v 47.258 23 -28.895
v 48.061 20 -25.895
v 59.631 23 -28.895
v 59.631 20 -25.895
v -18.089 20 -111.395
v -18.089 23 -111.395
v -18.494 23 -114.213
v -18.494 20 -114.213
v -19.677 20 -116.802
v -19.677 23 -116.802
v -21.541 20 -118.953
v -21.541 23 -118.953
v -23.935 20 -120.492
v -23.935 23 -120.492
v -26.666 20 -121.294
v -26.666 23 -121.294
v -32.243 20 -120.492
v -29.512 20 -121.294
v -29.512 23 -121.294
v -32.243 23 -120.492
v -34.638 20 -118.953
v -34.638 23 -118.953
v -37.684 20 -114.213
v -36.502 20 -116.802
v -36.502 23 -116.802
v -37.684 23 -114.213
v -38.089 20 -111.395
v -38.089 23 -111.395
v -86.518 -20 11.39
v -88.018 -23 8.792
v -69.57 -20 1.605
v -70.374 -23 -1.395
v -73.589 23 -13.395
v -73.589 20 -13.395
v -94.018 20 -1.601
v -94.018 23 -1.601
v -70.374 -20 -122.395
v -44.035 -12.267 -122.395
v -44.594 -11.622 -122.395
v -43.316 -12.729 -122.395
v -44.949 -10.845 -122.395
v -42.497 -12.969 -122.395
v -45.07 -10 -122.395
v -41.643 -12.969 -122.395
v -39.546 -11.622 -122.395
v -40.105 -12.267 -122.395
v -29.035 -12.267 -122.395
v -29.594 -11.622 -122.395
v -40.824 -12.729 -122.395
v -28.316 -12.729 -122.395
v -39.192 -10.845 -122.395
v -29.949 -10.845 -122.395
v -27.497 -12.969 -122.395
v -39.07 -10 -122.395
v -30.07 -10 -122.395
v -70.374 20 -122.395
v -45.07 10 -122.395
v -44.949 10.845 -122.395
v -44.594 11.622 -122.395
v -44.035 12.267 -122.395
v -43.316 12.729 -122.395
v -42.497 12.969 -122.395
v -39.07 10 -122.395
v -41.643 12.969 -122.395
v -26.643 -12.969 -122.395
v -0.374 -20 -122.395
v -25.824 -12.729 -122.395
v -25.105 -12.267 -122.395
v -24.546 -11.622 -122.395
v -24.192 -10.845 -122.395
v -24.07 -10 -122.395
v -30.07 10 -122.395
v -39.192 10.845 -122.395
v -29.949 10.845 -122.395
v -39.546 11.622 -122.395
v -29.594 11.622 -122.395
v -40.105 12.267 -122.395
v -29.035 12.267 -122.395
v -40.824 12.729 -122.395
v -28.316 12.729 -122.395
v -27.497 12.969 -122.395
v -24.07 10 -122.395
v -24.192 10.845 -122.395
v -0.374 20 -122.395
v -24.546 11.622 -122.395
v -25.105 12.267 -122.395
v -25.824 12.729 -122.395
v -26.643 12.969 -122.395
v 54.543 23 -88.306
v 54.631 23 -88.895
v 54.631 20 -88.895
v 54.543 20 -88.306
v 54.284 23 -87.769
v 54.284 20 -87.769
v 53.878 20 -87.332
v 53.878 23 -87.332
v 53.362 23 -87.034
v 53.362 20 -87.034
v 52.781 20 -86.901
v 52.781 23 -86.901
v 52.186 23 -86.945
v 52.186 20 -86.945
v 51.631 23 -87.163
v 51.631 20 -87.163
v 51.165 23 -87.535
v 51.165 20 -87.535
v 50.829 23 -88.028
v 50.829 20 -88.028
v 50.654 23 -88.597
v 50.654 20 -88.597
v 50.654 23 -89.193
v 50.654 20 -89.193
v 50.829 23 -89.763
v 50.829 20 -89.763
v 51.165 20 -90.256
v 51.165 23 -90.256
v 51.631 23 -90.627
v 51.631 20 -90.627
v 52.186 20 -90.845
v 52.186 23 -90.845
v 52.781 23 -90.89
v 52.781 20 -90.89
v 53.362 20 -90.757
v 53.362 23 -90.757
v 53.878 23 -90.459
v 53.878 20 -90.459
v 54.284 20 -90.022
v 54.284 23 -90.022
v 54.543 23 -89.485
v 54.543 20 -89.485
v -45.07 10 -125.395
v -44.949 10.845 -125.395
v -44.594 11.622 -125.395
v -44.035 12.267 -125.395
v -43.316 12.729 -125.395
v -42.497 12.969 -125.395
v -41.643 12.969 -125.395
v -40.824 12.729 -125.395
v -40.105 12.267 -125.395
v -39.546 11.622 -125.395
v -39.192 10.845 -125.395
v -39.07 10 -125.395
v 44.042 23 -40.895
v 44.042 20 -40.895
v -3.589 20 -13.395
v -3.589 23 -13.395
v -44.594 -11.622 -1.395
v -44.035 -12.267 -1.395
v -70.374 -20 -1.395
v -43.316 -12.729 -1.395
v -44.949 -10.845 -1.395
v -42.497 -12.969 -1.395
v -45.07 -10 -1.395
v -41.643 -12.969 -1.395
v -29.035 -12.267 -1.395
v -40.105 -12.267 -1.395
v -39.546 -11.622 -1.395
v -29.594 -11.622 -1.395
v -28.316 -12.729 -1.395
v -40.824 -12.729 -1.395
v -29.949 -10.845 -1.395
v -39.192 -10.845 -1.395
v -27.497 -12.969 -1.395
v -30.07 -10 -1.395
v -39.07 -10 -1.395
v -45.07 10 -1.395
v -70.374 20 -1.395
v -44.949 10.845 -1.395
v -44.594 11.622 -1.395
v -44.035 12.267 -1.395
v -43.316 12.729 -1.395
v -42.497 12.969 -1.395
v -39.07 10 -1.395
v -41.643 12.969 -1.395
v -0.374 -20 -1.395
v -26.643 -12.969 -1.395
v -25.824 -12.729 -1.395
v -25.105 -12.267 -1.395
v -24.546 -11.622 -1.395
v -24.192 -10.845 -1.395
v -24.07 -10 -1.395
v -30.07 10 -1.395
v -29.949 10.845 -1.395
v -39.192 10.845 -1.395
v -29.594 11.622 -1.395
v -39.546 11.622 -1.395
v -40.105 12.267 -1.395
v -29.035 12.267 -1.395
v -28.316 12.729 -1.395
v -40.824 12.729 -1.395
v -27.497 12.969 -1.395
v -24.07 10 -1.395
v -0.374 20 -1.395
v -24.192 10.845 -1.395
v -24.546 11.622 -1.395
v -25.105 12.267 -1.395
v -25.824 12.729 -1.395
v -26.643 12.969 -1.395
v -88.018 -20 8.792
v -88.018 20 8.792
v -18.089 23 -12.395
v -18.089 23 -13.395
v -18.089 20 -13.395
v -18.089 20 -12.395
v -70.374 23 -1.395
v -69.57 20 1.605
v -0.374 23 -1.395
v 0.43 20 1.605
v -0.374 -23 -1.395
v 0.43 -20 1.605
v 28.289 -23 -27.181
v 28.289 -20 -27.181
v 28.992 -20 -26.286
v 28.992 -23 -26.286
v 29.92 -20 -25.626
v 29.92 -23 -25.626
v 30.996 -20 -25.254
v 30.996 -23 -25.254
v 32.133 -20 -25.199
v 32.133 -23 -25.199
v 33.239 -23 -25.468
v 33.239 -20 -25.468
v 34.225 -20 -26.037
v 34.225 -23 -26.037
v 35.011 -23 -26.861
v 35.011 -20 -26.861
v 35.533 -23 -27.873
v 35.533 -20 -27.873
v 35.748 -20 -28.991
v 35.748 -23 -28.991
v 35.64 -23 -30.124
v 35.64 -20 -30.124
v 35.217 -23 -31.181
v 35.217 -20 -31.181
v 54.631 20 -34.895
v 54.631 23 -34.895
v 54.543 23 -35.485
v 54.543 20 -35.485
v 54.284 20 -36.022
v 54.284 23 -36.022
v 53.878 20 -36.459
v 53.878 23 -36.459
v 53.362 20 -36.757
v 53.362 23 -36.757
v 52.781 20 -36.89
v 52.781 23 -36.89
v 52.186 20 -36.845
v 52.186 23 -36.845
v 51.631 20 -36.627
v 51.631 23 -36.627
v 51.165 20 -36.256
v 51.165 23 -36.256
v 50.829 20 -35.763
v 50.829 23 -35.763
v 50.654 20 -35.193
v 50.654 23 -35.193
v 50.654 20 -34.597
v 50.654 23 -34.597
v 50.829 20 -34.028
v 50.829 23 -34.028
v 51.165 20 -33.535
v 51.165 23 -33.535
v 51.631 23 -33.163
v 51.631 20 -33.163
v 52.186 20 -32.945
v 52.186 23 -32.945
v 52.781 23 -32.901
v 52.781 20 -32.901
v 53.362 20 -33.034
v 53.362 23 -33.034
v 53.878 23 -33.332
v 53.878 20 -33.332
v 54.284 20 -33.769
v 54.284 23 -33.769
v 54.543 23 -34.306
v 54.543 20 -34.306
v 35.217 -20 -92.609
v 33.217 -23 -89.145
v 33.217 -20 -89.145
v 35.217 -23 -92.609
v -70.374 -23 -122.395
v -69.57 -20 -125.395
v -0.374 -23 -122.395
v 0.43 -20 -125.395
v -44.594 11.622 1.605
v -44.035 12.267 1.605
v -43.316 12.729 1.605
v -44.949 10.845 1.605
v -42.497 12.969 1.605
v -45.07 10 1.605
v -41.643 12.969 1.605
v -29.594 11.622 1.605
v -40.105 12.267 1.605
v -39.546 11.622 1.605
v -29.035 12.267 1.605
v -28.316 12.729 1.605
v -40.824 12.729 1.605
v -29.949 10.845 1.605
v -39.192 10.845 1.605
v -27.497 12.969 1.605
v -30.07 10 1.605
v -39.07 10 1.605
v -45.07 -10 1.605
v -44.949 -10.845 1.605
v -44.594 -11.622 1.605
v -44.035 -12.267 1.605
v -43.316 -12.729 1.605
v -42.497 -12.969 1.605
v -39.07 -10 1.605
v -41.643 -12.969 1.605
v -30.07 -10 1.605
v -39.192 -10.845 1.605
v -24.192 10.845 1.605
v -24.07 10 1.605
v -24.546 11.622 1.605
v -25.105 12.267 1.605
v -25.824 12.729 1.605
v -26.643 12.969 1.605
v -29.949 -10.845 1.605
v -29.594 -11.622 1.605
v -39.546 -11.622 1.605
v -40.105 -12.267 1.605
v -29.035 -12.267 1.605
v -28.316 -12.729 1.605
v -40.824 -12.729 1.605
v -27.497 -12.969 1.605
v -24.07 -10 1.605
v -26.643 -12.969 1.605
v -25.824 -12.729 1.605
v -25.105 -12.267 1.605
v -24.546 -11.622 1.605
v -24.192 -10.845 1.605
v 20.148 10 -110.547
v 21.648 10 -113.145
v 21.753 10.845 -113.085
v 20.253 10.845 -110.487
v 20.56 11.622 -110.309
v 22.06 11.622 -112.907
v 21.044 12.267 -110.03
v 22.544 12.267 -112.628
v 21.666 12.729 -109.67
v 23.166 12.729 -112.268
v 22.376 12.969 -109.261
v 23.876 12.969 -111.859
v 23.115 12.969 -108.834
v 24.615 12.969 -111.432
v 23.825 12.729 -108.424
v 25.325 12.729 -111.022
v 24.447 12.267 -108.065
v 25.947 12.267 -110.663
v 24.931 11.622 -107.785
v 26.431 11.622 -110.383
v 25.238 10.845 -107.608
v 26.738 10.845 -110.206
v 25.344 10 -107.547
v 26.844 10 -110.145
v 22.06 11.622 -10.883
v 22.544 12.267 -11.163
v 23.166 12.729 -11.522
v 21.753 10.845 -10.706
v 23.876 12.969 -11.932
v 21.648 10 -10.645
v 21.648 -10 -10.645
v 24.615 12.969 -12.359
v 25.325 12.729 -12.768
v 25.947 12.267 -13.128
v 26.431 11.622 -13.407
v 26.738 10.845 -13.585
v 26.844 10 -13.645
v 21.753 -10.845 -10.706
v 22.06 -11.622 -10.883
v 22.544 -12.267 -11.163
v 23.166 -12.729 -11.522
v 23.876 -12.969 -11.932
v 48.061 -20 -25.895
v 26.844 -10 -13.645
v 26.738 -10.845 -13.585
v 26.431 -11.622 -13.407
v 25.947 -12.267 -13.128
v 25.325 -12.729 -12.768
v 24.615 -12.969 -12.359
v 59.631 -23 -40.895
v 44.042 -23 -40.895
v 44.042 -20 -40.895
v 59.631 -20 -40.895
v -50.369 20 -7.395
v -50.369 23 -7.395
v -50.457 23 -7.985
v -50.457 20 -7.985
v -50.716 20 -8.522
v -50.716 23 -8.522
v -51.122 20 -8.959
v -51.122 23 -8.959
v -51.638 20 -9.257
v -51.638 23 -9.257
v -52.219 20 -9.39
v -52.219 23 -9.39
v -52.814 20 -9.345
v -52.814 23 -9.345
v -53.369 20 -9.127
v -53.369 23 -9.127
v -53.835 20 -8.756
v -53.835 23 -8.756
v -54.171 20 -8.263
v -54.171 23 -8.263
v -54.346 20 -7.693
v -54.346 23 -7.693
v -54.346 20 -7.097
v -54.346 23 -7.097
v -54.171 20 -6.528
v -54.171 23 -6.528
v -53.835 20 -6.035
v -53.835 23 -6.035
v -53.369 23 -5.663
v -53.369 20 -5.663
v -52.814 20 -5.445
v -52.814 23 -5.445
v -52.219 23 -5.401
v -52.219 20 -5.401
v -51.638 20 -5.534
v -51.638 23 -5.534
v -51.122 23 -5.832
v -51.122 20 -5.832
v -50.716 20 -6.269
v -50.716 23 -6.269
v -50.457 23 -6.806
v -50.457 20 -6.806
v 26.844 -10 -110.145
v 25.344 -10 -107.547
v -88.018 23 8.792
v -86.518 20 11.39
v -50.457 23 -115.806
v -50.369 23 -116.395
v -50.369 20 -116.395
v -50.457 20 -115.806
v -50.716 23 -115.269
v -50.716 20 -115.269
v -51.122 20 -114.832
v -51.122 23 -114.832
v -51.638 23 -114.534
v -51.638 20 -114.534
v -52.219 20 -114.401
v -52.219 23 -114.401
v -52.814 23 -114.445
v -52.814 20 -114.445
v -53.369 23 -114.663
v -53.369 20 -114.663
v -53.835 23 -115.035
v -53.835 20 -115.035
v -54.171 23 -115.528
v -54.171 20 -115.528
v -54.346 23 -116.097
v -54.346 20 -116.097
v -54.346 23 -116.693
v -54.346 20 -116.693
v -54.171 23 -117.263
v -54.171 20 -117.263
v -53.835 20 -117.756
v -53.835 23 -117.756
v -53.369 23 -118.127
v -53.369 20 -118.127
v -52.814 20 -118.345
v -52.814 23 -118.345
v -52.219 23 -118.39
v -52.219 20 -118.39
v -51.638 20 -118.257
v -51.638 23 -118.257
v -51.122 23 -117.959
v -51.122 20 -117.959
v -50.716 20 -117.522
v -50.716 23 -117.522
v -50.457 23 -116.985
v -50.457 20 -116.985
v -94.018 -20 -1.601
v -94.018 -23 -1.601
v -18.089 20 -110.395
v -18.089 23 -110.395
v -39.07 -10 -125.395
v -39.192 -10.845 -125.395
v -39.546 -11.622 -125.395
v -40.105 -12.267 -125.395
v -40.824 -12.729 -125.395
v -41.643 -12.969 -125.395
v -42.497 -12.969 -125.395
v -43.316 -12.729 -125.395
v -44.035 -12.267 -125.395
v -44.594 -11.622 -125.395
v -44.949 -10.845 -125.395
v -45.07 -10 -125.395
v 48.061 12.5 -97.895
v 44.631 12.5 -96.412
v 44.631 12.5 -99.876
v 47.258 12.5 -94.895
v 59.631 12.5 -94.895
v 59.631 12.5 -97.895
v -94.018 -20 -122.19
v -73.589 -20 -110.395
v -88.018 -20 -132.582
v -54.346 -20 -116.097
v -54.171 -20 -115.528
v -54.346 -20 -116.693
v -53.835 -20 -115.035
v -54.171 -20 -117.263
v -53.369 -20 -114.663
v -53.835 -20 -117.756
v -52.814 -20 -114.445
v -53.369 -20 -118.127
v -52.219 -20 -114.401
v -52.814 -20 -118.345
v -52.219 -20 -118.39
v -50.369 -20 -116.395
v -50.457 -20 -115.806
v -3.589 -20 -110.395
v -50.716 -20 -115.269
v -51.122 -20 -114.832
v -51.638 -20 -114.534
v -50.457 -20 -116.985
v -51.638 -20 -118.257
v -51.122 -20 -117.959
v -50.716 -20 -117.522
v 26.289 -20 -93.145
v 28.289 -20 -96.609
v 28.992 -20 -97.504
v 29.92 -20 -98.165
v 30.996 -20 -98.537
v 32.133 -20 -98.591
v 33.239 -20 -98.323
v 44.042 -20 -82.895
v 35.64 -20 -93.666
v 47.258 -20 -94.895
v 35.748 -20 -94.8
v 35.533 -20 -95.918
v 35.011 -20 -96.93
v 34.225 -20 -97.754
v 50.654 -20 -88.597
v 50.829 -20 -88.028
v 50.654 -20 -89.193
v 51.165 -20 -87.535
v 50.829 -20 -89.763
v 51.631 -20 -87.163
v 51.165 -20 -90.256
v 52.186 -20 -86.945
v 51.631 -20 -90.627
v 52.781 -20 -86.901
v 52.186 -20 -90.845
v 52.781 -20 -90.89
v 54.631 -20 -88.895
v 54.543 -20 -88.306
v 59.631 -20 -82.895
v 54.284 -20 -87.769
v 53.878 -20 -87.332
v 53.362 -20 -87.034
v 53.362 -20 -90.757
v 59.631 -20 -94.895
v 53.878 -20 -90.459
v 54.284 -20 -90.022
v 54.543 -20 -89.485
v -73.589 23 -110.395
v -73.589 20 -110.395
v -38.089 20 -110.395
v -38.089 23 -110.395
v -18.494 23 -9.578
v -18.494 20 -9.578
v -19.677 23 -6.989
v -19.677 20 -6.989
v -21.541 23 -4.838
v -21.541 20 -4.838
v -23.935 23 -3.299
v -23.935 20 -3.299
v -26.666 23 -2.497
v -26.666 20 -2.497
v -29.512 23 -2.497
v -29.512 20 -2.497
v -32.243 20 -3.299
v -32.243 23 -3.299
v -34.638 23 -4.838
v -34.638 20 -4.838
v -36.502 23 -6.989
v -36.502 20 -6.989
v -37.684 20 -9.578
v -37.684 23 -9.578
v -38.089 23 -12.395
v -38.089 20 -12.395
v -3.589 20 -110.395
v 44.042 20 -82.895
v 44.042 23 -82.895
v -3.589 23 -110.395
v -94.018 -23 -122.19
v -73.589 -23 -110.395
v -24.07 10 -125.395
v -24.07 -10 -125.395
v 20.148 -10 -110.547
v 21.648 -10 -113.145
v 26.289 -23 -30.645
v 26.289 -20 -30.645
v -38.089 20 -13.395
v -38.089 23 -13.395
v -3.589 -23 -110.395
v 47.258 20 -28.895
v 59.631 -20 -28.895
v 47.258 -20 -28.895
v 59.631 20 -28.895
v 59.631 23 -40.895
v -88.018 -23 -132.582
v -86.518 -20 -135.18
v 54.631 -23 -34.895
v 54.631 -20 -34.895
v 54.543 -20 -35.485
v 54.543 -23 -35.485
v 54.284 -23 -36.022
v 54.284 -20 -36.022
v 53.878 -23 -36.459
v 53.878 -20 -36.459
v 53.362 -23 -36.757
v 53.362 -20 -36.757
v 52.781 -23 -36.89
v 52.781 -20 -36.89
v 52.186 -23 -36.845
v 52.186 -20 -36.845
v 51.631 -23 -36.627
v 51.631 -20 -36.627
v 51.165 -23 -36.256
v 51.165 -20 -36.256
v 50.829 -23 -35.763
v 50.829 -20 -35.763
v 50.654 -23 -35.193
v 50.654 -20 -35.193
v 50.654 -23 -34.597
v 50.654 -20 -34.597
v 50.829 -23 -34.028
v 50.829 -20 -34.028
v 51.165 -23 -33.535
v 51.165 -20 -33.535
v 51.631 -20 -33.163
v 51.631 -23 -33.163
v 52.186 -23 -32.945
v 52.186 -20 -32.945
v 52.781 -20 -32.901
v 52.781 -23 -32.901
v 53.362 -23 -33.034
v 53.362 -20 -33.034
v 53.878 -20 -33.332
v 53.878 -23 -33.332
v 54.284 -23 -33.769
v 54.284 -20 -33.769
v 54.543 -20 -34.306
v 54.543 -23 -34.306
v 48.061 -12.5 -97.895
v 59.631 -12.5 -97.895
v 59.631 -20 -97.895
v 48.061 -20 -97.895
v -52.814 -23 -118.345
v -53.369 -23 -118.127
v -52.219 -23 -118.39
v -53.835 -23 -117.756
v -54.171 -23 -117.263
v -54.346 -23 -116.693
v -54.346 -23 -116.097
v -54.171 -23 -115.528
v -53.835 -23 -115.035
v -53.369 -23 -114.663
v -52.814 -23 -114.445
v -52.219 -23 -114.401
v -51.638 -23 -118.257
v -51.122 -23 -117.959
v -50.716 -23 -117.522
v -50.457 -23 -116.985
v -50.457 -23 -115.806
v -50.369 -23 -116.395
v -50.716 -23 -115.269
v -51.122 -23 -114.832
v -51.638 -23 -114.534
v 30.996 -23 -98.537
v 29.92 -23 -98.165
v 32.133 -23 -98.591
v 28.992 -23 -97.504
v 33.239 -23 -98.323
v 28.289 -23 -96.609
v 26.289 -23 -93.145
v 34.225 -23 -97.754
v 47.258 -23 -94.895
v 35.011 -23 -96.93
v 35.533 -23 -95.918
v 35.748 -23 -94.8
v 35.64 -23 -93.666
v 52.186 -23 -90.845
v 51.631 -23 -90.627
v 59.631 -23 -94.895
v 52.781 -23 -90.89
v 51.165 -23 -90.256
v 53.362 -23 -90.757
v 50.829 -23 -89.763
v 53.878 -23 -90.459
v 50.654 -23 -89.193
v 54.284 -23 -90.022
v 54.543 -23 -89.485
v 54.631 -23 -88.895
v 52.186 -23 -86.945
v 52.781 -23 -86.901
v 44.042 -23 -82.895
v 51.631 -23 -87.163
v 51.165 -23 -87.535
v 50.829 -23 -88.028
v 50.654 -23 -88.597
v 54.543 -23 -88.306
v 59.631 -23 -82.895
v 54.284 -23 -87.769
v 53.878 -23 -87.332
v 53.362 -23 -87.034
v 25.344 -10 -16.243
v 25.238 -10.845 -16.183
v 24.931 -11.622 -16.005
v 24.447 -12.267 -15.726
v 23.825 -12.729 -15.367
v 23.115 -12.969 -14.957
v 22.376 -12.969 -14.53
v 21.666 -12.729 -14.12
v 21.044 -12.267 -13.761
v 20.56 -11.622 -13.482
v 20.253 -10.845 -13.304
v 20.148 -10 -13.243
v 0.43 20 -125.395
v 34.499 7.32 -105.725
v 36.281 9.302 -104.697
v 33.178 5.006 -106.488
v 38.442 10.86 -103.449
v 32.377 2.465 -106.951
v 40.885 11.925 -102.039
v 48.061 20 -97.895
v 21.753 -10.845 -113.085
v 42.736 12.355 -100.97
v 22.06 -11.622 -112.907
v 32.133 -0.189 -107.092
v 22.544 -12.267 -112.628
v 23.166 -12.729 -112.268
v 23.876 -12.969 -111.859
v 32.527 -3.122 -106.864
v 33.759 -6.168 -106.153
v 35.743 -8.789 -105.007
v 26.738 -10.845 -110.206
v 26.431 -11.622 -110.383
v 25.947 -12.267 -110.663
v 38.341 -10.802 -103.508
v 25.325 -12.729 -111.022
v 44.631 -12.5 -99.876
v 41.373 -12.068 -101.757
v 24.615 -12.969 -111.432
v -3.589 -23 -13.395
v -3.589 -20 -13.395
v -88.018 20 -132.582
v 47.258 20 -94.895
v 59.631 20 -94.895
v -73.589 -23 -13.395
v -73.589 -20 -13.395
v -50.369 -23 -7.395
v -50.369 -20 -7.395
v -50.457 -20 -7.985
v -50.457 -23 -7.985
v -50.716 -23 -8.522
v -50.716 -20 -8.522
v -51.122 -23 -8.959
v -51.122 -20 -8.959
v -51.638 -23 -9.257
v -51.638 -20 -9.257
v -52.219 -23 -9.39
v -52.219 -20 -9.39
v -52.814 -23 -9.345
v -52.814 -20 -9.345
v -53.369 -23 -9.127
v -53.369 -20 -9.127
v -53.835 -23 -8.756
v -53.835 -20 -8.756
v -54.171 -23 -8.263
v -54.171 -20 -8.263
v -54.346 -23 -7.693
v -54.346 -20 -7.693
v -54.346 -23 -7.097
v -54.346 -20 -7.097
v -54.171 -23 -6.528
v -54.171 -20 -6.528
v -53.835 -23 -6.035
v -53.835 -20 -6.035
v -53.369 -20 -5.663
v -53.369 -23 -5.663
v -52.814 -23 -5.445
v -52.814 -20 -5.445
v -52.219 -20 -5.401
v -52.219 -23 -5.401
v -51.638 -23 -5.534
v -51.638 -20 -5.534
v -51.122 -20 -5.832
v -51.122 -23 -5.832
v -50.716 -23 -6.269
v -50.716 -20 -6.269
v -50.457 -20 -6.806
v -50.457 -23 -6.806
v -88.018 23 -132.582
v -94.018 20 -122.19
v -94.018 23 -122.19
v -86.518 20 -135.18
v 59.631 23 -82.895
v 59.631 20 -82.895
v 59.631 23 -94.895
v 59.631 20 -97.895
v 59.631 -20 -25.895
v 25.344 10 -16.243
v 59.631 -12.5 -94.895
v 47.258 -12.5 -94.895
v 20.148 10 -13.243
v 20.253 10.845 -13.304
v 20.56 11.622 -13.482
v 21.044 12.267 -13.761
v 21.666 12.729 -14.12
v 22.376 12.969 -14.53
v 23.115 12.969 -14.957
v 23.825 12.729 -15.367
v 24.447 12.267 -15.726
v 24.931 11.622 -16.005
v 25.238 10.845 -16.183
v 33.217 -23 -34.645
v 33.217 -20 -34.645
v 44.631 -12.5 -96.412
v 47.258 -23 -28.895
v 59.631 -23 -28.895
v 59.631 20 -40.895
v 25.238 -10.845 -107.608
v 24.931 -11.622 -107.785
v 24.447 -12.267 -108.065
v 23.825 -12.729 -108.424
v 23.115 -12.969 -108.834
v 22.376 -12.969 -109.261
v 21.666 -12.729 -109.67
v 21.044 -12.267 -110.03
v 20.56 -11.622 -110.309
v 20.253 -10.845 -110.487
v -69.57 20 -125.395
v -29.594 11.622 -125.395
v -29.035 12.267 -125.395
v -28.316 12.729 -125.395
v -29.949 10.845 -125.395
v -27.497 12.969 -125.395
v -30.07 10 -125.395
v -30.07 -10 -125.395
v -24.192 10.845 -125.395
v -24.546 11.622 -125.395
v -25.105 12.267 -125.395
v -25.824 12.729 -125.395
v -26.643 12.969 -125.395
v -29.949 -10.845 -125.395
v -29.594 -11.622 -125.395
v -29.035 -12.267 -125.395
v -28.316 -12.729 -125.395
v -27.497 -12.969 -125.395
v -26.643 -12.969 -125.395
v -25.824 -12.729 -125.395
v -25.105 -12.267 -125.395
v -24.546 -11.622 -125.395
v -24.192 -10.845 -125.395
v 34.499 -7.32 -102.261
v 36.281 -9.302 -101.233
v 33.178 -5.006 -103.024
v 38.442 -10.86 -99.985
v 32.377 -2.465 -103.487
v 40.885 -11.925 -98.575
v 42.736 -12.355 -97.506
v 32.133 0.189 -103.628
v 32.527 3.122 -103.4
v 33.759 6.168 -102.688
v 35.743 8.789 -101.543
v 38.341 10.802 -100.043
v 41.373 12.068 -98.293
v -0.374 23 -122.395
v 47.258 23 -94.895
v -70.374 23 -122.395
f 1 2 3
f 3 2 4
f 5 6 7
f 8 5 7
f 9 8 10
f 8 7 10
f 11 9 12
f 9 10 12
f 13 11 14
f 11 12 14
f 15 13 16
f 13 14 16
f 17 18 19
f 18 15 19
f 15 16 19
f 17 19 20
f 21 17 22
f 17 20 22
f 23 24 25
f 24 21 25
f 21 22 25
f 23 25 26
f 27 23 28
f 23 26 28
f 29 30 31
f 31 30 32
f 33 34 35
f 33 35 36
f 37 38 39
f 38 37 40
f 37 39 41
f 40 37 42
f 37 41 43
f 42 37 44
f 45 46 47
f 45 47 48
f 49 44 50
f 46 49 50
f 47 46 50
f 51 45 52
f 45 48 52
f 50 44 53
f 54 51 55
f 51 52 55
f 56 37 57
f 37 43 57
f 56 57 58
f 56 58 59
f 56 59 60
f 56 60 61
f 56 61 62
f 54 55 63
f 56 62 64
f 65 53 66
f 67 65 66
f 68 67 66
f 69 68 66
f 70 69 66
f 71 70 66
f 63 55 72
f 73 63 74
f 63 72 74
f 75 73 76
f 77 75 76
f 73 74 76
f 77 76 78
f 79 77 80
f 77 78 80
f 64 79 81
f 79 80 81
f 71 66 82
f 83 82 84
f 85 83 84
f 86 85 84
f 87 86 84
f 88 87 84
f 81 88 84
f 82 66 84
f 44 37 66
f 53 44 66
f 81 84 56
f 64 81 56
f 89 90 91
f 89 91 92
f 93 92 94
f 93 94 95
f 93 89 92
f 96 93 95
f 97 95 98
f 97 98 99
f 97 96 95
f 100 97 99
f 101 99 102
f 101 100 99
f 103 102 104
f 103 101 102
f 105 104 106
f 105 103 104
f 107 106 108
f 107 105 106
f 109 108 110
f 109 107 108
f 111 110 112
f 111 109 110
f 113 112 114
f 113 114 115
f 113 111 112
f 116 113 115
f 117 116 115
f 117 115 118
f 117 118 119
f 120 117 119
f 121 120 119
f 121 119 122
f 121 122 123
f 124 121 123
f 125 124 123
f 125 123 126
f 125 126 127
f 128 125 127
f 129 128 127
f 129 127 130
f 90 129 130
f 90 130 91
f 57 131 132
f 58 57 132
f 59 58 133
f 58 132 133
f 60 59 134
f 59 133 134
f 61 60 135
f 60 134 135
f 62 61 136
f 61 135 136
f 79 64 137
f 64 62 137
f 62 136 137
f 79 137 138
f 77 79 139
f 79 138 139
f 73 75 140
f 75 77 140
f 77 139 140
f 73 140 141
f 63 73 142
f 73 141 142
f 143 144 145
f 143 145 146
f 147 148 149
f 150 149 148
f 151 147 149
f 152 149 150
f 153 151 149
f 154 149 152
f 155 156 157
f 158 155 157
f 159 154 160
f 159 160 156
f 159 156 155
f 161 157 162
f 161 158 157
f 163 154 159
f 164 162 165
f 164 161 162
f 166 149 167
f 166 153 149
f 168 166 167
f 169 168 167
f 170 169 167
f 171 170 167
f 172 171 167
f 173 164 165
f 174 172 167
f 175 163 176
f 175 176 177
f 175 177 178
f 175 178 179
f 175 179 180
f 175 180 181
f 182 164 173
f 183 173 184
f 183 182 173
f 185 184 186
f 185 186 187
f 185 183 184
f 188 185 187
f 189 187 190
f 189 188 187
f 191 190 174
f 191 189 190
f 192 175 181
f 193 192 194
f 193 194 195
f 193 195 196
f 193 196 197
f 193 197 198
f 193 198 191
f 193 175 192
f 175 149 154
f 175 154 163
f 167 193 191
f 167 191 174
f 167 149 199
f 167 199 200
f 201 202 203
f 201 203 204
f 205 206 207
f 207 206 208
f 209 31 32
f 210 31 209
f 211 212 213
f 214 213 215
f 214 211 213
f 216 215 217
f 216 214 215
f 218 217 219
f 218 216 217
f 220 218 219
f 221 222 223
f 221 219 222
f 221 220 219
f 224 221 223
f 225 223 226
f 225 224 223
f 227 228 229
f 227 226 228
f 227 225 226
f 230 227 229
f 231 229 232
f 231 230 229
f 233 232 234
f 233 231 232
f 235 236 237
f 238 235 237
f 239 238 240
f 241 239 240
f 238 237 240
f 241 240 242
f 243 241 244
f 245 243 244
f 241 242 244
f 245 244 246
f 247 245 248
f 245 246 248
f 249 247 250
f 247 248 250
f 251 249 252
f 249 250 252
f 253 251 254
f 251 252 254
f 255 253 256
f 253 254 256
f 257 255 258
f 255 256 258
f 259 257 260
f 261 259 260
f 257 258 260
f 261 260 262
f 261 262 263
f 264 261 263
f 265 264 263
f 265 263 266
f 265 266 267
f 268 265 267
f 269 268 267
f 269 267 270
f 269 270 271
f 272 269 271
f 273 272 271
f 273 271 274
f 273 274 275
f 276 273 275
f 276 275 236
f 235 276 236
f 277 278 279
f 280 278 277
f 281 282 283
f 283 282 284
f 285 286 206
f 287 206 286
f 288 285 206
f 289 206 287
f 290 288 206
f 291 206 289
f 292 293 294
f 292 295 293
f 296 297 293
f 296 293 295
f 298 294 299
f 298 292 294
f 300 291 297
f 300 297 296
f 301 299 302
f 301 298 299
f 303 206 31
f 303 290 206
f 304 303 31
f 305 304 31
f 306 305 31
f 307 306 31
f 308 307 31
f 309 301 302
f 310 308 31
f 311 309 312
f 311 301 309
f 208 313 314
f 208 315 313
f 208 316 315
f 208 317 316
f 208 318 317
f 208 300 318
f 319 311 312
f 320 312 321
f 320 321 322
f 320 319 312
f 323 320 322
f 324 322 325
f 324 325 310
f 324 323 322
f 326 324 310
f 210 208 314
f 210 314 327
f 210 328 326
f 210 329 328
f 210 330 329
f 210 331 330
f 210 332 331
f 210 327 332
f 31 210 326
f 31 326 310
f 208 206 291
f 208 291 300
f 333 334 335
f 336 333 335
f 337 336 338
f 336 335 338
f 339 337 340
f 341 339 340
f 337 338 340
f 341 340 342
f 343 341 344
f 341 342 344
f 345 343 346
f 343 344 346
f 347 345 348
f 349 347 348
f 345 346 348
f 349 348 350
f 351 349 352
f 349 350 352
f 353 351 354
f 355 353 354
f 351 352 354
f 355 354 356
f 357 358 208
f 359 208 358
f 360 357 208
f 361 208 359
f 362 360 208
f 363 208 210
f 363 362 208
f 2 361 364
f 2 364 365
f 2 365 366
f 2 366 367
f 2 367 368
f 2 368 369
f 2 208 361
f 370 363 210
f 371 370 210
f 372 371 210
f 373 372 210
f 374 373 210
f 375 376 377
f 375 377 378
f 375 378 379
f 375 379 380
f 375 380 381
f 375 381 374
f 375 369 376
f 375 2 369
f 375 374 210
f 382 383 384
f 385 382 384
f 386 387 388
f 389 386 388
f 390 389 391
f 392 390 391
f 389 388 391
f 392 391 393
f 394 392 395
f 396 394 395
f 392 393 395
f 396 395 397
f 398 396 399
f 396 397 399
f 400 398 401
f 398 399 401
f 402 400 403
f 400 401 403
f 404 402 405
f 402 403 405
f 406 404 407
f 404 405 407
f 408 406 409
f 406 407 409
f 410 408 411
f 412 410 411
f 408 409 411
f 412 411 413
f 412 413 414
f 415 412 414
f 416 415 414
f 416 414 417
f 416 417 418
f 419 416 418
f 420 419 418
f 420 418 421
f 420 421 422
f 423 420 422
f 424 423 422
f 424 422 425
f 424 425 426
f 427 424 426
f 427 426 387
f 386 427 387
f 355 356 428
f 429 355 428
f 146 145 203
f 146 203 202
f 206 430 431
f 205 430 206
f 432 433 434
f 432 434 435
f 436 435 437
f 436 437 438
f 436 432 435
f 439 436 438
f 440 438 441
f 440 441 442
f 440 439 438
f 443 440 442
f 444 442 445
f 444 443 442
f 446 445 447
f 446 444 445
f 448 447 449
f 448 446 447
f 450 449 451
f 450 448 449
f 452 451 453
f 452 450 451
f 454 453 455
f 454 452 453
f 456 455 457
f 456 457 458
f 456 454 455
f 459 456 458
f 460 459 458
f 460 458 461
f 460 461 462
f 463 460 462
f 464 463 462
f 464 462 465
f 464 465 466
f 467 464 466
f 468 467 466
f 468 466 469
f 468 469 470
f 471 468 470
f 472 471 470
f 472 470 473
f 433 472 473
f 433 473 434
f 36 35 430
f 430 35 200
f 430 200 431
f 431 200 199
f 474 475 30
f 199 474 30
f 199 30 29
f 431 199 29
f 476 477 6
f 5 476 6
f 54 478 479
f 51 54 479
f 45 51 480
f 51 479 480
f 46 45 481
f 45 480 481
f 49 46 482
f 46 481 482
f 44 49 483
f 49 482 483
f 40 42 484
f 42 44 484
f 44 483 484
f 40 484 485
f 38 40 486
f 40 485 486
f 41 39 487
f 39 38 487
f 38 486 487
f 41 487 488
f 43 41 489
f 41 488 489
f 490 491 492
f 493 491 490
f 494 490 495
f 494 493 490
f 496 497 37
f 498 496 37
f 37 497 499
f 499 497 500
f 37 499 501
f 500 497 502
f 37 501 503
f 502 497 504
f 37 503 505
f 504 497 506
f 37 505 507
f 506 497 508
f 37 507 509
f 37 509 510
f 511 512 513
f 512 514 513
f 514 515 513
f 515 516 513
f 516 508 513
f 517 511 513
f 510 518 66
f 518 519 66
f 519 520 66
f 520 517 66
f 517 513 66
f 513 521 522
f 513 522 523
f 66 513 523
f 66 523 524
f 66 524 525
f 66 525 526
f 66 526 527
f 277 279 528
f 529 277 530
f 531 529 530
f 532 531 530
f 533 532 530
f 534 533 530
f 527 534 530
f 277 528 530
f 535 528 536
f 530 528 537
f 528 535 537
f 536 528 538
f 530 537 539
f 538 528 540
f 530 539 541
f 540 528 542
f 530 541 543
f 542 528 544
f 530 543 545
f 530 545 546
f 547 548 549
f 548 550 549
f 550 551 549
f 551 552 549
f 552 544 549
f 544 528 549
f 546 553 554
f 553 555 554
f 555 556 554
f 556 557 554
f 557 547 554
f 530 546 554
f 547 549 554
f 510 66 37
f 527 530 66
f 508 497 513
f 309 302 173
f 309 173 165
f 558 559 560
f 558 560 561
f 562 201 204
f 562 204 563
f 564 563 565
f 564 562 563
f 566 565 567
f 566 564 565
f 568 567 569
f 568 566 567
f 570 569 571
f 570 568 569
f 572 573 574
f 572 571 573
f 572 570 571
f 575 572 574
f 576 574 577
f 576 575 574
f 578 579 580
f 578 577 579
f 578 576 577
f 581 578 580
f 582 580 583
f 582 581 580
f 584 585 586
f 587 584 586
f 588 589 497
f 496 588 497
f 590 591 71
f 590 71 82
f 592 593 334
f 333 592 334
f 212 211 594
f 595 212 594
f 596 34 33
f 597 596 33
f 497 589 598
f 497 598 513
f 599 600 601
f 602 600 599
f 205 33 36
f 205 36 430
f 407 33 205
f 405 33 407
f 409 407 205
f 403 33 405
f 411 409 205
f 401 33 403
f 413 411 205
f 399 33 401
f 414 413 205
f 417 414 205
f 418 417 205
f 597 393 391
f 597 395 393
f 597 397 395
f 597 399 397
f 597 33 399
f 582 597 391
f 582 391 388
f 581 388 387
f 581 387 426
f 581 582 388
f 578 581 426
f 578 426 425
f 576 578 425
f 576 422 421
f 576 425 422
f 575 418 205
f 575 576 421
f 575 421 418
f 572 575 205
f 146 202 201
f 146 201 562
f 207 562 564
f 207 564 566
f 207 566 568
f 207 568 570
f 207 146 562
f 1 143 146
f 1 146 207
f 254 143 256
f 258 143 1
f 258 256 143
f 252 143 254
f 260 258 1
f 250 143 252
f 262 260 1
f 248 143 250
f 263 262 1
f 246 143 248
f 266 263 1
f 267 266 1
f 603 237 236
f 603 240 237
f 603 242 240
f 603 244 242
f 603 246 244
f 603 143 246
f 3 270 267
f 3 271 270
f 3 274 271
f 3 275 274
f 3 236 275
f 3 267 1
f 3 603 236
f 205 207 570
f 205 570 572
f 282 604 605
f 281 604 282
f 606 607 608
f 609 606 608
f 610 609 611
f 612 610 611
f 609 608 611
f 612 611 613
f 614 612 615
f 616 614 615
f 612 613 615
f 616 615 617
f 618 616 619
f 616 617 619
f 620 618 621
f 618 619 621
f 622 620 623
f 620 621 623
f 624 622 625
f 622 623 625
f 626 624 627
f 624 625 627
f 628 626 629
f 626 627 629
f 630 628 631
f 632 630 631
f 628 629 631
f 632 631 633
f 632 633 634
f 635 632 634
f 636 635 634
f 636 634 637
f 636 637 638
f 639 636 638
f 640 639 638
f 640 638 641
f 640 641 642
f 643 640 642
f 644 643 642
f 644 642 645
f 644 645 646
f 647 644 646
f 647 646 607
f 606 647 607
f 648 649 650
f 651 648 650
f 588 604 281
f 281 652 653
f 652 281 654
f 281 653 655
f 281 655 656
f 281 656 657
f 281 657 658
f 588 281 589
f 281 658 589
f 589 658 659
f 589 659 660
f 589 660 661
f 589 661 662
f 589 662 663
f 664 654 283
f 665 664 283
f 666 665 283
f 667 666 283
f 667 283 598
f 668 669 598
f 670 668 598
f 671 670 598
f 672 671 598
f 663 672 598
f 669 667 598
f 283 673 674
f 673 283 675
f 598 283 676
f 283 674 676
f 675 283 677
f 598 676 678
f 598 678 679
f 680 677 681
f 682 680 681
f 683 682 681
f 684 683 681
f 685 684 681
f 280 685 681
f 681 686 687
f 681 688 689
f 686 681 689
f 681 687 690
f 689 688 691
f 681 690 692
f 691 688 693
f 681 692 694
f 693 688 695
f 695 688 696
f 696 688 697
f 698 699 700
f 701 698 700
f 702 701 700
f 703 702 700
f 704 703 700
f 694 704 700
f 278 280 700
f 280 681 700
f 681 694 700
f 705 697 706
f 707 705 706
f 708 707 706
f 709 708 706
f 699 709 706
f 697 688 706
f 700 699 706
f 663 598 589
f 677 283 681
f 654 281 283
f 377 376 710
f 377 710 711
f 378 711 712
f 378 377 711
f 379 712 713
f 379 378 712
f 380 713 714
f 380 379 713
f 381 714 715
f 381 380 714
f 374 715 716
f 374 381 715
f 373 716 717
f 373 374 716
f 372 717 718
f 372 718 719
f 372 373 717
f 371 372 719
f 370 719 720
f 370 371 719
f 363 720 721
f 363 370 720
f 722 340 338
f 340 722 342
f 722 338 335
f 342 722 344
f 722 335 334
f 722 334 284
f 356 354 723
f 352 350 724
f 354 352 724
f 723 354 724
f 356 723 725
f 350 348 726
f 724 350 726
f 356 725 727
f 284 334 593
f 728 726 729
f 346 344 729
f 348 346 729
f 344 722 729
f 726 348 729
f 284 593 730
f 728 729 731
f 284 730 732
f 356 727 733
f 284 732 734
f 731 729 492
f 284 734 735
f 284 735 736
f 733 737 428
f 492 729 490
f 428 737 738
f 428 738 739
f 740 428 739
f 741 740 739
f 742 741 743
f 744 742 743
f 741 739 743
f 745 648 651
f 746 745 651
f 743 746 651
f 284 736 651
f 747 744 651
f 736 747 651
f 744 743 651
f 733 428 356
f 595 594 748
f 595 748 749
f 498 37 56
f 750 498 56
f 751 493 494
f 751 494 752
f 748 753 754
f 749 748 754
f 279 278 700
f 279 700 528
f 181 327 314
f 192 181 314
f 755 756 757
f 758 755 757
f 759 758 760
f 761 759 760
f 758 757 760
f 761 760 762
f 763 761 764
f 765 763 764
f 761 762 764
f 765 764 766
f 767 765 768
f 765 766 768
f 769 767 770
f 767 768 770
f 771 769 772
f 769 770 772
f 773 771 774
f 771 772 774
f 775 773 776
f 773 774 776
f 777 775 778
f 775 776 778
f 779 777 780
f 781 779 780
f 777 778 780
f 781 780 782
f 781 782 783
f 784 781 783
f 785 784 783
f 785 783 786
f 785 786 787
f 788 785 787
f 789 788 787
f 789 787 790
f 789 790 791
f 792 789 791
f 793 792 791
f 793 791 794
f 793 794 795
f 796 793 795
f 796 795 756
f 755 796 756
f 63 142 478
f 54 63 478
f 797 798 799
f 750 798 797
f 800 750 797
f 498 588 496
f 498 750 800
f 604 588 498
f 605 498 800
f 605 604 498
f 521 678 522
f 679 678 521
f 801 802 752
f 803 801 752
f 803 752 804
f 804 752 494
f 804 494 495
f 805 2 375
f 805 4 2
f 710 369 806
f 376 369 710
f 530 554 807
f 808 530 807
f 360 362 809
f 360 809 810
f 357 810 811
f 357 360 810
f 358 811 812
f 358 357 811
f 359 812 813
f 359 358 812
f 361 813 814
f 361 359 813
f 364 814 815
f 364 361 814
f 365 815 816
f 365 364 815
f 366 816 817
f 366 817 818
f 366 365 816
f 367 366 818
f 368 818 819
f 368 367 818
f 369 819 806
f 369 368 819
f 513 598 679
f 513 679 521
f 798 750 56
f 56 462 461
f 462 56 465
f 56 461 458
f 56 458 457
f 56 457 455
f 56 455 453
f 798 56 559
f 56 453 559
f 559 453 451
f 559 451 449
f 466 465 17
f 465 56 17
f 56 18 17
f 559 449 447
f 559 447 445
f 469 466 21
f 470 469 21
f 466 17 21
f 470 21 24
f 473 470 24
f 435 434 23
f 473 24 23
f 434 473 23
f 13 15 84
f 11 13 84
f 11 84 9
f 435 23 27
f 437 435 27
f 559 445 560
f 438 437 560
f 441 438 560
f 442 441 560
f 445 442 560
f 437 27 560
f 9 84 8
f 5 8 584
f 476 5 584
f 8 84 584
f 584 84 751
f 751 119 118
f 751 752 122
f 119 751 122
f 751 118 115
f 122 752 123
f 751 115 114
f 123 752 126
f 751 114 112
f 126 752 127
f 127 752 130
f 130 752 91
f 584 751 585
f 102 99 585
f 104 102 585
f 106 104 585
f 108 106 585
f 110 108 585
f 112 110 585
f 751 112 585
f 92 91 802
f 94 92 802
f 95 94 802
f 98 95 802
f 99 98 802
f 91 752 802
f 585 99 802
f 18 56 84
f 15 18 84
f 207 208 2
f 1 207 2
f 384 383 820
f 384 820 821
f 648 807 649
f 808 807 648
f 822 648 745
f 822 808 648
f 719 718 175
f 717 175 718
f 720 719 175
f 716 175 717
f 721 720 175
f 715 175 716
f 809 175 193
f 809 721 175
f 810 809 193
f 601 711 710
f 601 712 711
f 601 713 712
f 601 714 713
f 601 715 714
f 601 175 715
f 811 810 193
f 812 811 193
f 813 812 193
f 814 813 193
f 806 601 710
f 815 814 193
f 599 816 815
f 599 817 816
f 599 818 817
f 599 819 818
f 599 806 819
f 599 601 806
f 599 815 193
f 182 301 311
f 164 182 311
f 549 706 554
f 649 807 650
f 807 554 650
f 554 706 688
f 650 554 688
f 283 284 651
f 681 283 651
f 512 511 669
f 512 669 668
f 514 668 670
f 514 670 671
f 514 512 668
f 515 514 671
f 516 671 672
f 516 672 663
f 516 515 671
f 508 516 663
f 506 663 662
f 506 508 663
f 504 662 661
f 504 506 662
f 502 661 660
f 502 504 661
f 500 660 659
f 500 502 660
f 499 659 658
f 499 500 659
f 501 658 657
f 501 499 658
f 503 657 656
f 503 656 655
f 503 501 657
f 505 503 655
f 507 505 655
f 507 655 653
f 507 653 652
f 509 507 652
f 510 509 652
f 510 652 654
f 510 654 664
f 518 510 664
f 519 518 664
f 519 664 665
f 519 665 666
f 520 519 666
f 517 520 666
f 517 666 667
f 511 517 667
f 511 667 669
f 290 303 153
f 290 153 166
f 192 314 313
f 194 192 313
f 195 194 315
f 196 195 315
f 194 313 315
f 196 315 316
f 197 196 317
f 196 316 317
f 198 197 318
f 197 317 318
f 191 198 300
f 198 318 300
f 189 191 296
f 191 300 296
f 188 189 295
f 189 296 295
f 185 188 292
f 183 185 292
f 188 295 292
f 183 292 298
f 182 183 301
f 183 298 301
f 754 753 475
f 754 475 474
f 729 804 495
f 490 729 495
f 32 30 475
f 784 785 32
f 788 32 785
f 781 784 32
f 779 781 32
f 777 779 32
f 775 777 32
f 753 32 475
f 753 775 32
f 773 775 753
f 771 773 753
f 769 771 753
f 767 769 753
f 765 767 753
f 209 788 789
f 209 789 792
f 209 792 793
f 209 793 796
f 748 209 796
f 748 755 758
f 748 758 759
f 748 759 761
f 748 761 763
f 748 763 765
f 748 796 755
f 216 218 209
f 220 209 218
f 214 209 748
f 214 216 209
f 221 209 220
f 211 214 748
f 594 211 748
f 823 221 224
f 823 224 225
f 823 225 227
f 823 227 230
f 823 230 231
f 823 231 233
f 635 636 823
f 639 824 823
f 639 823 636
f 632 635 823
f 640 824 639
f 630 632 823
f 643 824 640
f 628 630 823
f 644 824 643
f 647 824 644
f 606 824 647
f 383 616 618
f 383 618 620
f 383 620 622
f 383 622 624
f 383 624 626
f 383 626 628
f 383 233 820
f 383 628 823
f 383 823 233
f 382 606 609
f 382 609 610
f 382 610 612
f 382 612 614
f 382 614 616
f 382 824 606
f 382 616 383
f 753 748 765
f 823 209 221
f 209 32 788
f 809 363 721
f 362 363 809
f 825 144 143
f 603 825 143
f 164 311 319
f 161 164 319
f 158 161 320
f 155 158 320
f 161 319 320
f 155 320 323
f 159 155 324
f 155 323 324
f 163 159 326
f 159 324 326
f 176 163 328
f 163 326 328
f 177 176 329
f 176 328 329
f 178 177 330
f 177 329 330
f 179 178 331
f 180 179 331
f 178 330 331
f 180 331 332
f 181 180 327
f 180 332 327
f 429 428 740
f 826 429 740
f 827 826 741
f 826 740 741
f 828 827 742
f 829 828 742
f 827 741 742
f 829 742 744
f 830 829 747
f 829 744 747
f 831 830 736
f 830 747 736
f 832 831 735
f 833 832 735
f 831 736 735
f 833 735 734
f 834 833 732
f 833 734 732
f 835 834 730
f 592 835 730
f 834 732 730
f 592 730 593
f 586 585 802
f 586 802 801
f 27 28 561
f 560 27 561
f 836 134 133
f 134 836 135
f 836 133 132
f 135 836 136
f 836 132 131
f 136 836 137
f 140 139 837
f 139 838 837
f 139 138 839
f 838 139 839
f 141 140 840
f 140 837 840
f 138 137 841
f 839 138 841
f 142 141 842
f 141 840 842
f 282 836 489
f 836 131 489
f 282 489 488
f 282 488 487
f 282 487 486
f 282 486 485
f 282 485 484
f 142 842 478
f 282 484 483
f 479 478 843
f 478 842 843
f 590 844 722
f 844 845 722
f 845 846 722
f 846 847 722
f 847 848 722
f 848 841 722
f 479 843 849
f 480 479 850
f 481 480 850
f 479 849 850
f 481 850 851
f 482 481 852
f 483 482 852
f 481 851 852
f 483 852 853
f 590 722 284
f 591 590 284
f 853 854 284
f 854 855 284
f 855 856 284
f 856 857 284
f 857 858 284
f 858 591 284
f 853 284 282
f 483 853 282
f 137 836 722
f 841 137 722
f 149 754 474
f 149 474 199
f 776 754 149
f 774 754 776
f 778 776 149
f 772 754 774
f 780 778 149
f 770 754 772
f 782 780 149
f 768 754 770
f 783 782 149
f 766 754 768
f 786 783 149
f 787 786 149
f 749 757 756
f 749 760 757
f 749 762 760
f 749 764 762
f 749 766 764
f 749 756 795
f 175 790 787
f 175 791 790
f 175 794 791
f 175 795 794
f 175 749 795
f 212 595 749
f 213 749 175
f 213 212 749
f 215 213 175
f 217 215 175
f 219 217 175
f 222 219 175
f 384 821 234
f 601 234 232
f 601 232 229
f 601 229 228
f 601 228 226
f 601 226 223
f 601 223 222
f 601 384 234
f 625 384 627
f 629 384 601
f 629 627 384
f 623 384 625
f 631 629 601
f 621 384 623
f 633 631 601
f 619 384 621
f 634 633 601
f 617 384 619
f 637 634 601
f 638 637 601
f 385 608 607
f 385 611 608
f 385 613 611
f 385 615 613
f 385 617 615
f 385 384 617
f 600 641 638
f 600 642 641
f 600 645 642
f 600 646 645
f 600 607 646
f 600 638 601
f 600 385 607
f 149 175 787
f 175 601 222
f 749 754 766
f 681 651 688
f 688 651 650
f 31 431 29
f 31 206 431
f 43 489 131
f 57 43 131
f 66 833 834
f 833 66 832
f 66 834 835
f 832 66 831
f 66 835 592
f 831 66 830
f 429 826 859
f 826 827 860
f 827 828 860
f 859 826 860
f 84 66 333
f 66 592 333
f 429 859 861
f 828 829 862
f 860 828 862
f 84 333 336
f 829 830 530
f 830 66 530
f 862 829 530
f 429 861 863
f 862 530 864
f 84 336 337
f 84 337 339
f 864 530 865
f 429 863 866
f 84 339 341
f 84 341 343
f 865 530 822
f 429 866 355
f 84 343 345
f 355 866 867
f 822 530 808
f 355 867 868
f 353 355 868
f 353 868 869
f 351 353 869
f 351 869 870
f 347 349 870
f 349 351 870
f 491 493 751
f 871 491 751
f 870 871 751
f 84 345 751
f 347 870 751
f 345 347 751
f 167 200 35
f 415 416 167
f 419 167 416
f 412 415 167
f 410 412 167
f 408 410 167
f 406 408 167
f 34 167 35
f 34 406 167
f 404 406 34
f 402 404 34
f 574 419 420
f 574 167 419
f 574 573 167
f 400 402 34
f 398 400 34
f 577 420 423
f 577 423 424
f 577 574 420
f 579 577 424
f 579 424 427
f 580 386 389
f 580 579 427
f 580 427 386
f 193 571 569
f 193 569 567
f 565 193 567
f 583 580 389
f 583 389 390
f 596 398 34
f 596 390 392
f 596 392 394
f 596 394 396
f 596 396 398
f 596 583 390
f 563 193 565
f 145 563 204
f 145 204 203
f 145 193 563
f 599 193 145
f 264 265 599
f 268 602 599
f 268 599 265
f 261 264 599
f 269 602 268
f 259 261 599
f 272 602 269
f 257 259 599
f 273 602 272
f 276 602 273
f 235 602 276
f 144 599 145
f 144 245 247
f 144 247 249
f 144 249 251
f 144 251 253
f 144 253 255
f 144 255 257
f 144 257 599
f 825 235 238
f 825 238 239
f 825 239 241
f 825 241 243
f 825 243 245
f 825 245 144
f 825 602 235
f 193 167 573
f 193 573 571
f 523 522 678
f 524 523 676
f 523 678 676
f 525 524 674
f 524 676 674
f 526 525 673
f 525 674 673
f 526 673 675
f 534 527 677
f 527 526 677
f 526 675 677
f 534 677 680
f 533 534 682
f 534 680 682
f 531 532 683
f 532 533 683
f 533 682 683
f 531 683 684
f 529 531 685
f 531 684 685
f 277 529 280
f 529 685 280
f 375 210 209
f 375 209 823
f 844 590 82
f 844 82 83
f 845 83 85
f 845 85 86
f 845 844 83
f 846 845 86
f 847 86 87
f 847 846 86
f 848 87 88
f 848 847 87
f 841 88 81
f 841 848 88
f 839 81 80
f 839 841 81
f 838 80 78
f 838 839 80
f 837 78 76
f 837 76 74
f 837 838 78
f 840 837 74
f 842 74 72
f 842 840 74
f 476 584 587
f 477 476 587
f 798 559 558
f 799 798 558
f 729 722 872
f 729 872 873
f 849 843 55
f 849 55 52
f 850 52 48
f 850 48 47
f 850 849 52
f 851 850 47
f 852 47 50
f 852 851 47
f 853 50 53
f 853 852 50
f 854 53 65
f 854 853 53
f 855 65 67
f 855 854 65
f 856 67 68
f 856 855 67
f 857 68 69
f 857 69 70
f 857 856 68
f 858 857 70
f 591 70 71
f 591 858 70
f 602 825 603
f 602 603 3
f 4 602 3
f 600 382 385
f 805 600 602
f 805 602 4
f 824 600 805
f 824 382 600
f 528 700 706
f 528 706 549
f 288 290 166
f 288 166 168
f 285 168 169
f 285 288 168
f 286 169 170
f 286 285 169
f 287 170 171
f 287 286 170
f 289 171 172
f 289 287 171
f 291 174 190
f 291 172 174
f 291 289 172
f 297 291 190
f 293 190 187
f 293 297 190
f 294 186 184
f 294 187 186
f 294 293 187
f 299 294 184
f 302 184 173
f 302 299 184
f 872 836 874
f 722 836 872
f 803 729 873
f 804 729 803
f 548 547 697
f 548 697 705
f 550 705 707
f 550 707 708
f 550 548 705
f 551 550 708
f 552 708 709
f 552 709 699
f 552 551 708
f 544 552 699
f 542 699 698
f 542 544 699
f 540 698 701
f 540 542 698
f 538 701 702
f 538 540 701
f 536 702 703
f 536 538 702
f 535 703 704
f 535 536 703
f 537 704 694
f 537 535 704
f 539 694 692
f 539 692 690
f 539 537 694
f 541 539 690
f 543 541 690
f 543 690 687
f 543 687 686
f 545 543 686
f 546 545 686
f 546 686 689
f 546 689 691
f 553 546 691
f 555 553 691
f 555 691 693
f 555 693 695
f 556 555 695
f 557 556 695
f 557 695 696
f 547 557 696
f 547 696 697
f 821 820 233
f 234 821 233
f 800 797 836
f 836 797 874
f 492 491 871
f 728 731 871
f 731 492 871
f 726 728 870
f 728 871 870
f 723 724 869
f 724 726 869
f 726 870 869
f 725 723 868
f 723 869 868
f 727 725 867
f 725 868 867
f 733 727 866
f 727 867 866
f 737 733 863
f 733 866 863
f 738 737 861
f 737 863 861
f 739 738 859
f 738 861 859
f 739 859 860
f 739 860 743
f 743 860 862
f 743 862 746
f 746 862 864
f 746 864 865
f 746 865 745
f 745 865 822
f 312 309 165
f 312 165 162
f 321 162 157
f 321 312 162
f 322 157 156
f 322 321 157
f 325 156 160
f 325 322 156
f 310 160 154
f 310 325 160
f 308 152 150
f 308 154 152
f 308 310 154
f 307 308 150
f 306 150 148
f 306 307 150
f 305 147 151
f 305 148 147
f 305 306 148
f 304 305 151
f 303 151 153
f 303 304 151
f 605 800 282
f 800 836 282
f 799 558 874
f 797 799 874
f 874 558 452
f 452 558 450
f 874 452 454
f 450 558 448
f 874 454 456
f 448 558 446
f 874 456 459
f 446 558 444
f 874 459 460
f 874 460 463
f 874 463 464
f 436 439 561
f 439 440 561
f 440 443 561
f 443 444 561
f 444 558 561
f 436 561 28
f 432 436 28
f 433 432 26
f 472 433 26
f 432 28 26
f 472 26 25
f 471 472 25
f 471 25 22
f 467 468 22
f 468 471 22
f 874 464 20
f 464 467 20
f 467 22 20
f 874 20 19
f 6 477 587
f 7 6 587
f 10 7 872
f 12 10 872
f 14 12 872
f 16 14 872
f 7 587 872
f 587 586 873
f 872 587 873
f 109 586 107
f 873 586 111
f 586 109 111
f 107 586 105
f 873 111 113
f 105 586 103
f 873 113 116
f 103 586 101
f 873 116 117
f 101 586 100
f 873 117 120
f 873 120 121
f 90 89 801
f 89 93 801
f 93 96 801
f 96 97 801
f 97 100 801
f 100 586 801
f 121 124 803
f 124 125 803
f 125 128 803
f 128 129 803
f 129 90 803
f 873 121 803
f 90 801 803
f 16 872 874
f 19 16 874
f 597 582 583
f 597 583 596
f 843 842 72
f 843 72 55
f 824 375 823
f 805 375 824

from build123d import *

# Parameters (mm, degrees)
CUT_EXTRUDE3_DEPTH      = 5
CUT_EXTRUDE4_DEPTH      = 10
CHAMFER1_SIZE           = 3
CUT_EXTRUDE6_DEPTH      = 3
F_4_0MM_DOWEL_HOLE2_D   = 4
CUT_EXTRUDE9_DEPTH      = 10
CUT_EXTRUDE7_DEPTH      = 146.985046122
CUT_EXTRUDE7_DEPTH_BACK = 5


with BuildPart() as part:
    # Sweep8: sweep along a path in Sketch6
    with BuildLine(Plane(origin=(0, 0, 0), x_dir=(1, 0, 0), z_dir=(0, 1, 0))) as sweep8_path:
        Line((-87.320508076, -10), (-70, 0))
        Line((-70, 0), (0, 0))
        Line((0, 0), (47.631397208, 27.5))
        Line((47.631397208, 27.5), (59.631397208, 27.5))
    # Sketch7 → Sweep8 (sweep)
    with BuildSketch(Plane(origin=(0, 0, 0), x_dir=(0, 0, -1), z_dir=(1, 0, 0))):
        Polygon((-1.604651163, -23), (-1.604651163, 23), (13.395348837, 23), (13.395348837, 20), (1.395348837, 20), (1.395348837, -20), (13.395348837, -20), (13.395348837, -23), align=None)
    sweep(path=sweep8_path.line, transition=Transition.RIGHT)

    # Sketch10 → Cut-Extrude3 (cut)
    with BuildSketch(Plane(origin=(0, 23, 0), x_dir=(1, 0, 0), z_dir=(0, 1, 0))):
        with BuildLine():
            Line((-38.089272903, 13.395348837), (-18.089272903, 13.395348837))
            Line((-18.089272903, 13.395348837), (-18.089272903, 12.395348837))
            ThreePointArc((-18.089272903, 12.395348837), (-28.089272903, 2.395348837), (-38.089272903, 12.395348837))
            Line((-38.089272903, 12.395348837), (-38.089272903, 13.395348837))
        make_face()
    extrude(amount=-CUT_EXTRUDE3_DEPTH, mode=Mode.SUBTRACT)

    # Sketch11 → Cut-Extrude4 (cut)
    with BuildSketch(Plane.XY.offset(1.604651163)):
        with BuildLine():
            Line((-45.070035017, -10), (-45.070035017, 10))
            ThreePointArc((-45.070035017, 10), (-42.070035017, 13), (-39.070035017, 10))
            Line((-39.070035017, 10), (-39.070035017, -10))
            ThreePointArc((-39.070035017, -10), (-42.070035017, -13), (-45.070035017, -10))
        make_face()
        with BuildLine():
            Line((-24.070035017, -10), (-24.070035017, 10))
            ThreePointArc((-24.070035017, 10), (-27.070035017, 13), (-30.070035017, 10))
            Line((-30.070035017, 10), (-30.070035017, -10))
            ThreePointArc((-30.070035017, -10), (-27.070035017, -13), (-24.070035017, -10))
        make_face()
    extrude(amount=-CUT_EXTRUDE4_DEPTH, mode=Mode.SUBTRACT)

    # Chamfer1
    chamfer1_edges = [part.edges().sort_by_distance(p)[0] for p in [
        (-78.044108756, -23, 6.497159917),
        (-34.570035017, -23, 1.604651163),
        (24.245663587, -23, -12.145348837),
        (-78.044108756, 23, 6.497159917),
        (-34.570035017, 23, 1.604651163),
        (24.245663587, 23, -12.145348837),
        (53.8463797, -23, -25.895348837),
        (53.8463797, 23, -25.895348837),
    ]]
    chamfer(chamfer1_edges, length=CHAMFER1_SIZE)

    # Sketch14 → Cut-Extrude6 (cut)
    with BuildSketch(Plane(origin=(0.802325581, 0, 1.389668671), x_dir=(0.8660254037844379, 0, -0.5000000000000014), z_dir=(0.5000000000000014, 0, 0.8660254037844379))):
        with BuildLine():
            Line((24.070035017, -10), (24.070035017, 10))
            ThreePointArc((24.070035017, 10), (27.070035017, 13), (30.070035017, 10))
            Line((30.070035017, 10), (30.070035017, -10))
            ThreePointArc((30.070035017, -10), (27.070035017, -13), (24.070035017, -10))
        make_face()
    extrude(amount=-CUT_EXTRUDE6_DEPTH, mode=Mode.SUBTRACT)

    # Ø4.0mm Dowel Hole2 (through all)
    with Locations(Plane(origin=(0, -23, 0), x_dir=(-1, 0, 0), z_dir=(0, -1, 0))):
        with Locations((52.368602792, 7.395348837), (-52.631397208, 34.895348837)):
            Hole(F_4_0MM_DOWEL_HOLE2_D / 2)

    # Sketch22 → Cut-Extrude9 (cut)
    with BuildSketch(Plane.XZ.offset(23)):
        with BuildLine():
            Line((28.288603527, -27.181247222), (26.288603527, -30.645348837))
            Line((26.288603527, -30.645348837), (33.216806758, -34.645348837))
            Line((33.216806758, -34.645348837), (35.216806758, -31.181247222))
            ThreePointArc((35.216806758, -31.181247222), (33.752705142, -25.717145607), (28.288603527, -27.181247222))
        make_face()
    extrude(amount=-CUT_EXTRUDE9_DEPTH, mode=Mode.SUBTRACT)


with BuildPart() as body_2:
    # Mirror2: mirrored copy
    add(part.part.mirror(Plane(origin=(0, 0, -61.895348837), x_dir=(1, 0, 0), z_dir=(0, 0, -1))))

    # Sketch20 → Cut-Extrude7 (cut, two sides: drawn at the far end of the back side and taken through both)
    with BuildSketch(Plane(origin=(0, 0, -97.895348837), x_dir=(-1, 0, 0), z_dir=(0, 0, -1)).offset(-CUT_EXTRUDE7_DEPTH_BACK)):
        with BuildLine():
            ThreePointArc((-44.631397208, -12.5), (-32.131397208, 0), (-44.631397208, 12.5))
            Line((-44.631397208, 12.5), (-59.631397208, 12.5))
            Line((-59.631397208, 12.5), (-59.631397208, -12.5))
            Line((-59.631397208, -12.5), (-44.631397208, -12.5))
        make_face()
    extrude(amount=CUT_EXTRUDE7_DEPTH + CUT_EXTRUDE7_DEPTH_BACK, mode=Mode.SUBTRACT)


solid = Compound([part.part, body_2.part])
